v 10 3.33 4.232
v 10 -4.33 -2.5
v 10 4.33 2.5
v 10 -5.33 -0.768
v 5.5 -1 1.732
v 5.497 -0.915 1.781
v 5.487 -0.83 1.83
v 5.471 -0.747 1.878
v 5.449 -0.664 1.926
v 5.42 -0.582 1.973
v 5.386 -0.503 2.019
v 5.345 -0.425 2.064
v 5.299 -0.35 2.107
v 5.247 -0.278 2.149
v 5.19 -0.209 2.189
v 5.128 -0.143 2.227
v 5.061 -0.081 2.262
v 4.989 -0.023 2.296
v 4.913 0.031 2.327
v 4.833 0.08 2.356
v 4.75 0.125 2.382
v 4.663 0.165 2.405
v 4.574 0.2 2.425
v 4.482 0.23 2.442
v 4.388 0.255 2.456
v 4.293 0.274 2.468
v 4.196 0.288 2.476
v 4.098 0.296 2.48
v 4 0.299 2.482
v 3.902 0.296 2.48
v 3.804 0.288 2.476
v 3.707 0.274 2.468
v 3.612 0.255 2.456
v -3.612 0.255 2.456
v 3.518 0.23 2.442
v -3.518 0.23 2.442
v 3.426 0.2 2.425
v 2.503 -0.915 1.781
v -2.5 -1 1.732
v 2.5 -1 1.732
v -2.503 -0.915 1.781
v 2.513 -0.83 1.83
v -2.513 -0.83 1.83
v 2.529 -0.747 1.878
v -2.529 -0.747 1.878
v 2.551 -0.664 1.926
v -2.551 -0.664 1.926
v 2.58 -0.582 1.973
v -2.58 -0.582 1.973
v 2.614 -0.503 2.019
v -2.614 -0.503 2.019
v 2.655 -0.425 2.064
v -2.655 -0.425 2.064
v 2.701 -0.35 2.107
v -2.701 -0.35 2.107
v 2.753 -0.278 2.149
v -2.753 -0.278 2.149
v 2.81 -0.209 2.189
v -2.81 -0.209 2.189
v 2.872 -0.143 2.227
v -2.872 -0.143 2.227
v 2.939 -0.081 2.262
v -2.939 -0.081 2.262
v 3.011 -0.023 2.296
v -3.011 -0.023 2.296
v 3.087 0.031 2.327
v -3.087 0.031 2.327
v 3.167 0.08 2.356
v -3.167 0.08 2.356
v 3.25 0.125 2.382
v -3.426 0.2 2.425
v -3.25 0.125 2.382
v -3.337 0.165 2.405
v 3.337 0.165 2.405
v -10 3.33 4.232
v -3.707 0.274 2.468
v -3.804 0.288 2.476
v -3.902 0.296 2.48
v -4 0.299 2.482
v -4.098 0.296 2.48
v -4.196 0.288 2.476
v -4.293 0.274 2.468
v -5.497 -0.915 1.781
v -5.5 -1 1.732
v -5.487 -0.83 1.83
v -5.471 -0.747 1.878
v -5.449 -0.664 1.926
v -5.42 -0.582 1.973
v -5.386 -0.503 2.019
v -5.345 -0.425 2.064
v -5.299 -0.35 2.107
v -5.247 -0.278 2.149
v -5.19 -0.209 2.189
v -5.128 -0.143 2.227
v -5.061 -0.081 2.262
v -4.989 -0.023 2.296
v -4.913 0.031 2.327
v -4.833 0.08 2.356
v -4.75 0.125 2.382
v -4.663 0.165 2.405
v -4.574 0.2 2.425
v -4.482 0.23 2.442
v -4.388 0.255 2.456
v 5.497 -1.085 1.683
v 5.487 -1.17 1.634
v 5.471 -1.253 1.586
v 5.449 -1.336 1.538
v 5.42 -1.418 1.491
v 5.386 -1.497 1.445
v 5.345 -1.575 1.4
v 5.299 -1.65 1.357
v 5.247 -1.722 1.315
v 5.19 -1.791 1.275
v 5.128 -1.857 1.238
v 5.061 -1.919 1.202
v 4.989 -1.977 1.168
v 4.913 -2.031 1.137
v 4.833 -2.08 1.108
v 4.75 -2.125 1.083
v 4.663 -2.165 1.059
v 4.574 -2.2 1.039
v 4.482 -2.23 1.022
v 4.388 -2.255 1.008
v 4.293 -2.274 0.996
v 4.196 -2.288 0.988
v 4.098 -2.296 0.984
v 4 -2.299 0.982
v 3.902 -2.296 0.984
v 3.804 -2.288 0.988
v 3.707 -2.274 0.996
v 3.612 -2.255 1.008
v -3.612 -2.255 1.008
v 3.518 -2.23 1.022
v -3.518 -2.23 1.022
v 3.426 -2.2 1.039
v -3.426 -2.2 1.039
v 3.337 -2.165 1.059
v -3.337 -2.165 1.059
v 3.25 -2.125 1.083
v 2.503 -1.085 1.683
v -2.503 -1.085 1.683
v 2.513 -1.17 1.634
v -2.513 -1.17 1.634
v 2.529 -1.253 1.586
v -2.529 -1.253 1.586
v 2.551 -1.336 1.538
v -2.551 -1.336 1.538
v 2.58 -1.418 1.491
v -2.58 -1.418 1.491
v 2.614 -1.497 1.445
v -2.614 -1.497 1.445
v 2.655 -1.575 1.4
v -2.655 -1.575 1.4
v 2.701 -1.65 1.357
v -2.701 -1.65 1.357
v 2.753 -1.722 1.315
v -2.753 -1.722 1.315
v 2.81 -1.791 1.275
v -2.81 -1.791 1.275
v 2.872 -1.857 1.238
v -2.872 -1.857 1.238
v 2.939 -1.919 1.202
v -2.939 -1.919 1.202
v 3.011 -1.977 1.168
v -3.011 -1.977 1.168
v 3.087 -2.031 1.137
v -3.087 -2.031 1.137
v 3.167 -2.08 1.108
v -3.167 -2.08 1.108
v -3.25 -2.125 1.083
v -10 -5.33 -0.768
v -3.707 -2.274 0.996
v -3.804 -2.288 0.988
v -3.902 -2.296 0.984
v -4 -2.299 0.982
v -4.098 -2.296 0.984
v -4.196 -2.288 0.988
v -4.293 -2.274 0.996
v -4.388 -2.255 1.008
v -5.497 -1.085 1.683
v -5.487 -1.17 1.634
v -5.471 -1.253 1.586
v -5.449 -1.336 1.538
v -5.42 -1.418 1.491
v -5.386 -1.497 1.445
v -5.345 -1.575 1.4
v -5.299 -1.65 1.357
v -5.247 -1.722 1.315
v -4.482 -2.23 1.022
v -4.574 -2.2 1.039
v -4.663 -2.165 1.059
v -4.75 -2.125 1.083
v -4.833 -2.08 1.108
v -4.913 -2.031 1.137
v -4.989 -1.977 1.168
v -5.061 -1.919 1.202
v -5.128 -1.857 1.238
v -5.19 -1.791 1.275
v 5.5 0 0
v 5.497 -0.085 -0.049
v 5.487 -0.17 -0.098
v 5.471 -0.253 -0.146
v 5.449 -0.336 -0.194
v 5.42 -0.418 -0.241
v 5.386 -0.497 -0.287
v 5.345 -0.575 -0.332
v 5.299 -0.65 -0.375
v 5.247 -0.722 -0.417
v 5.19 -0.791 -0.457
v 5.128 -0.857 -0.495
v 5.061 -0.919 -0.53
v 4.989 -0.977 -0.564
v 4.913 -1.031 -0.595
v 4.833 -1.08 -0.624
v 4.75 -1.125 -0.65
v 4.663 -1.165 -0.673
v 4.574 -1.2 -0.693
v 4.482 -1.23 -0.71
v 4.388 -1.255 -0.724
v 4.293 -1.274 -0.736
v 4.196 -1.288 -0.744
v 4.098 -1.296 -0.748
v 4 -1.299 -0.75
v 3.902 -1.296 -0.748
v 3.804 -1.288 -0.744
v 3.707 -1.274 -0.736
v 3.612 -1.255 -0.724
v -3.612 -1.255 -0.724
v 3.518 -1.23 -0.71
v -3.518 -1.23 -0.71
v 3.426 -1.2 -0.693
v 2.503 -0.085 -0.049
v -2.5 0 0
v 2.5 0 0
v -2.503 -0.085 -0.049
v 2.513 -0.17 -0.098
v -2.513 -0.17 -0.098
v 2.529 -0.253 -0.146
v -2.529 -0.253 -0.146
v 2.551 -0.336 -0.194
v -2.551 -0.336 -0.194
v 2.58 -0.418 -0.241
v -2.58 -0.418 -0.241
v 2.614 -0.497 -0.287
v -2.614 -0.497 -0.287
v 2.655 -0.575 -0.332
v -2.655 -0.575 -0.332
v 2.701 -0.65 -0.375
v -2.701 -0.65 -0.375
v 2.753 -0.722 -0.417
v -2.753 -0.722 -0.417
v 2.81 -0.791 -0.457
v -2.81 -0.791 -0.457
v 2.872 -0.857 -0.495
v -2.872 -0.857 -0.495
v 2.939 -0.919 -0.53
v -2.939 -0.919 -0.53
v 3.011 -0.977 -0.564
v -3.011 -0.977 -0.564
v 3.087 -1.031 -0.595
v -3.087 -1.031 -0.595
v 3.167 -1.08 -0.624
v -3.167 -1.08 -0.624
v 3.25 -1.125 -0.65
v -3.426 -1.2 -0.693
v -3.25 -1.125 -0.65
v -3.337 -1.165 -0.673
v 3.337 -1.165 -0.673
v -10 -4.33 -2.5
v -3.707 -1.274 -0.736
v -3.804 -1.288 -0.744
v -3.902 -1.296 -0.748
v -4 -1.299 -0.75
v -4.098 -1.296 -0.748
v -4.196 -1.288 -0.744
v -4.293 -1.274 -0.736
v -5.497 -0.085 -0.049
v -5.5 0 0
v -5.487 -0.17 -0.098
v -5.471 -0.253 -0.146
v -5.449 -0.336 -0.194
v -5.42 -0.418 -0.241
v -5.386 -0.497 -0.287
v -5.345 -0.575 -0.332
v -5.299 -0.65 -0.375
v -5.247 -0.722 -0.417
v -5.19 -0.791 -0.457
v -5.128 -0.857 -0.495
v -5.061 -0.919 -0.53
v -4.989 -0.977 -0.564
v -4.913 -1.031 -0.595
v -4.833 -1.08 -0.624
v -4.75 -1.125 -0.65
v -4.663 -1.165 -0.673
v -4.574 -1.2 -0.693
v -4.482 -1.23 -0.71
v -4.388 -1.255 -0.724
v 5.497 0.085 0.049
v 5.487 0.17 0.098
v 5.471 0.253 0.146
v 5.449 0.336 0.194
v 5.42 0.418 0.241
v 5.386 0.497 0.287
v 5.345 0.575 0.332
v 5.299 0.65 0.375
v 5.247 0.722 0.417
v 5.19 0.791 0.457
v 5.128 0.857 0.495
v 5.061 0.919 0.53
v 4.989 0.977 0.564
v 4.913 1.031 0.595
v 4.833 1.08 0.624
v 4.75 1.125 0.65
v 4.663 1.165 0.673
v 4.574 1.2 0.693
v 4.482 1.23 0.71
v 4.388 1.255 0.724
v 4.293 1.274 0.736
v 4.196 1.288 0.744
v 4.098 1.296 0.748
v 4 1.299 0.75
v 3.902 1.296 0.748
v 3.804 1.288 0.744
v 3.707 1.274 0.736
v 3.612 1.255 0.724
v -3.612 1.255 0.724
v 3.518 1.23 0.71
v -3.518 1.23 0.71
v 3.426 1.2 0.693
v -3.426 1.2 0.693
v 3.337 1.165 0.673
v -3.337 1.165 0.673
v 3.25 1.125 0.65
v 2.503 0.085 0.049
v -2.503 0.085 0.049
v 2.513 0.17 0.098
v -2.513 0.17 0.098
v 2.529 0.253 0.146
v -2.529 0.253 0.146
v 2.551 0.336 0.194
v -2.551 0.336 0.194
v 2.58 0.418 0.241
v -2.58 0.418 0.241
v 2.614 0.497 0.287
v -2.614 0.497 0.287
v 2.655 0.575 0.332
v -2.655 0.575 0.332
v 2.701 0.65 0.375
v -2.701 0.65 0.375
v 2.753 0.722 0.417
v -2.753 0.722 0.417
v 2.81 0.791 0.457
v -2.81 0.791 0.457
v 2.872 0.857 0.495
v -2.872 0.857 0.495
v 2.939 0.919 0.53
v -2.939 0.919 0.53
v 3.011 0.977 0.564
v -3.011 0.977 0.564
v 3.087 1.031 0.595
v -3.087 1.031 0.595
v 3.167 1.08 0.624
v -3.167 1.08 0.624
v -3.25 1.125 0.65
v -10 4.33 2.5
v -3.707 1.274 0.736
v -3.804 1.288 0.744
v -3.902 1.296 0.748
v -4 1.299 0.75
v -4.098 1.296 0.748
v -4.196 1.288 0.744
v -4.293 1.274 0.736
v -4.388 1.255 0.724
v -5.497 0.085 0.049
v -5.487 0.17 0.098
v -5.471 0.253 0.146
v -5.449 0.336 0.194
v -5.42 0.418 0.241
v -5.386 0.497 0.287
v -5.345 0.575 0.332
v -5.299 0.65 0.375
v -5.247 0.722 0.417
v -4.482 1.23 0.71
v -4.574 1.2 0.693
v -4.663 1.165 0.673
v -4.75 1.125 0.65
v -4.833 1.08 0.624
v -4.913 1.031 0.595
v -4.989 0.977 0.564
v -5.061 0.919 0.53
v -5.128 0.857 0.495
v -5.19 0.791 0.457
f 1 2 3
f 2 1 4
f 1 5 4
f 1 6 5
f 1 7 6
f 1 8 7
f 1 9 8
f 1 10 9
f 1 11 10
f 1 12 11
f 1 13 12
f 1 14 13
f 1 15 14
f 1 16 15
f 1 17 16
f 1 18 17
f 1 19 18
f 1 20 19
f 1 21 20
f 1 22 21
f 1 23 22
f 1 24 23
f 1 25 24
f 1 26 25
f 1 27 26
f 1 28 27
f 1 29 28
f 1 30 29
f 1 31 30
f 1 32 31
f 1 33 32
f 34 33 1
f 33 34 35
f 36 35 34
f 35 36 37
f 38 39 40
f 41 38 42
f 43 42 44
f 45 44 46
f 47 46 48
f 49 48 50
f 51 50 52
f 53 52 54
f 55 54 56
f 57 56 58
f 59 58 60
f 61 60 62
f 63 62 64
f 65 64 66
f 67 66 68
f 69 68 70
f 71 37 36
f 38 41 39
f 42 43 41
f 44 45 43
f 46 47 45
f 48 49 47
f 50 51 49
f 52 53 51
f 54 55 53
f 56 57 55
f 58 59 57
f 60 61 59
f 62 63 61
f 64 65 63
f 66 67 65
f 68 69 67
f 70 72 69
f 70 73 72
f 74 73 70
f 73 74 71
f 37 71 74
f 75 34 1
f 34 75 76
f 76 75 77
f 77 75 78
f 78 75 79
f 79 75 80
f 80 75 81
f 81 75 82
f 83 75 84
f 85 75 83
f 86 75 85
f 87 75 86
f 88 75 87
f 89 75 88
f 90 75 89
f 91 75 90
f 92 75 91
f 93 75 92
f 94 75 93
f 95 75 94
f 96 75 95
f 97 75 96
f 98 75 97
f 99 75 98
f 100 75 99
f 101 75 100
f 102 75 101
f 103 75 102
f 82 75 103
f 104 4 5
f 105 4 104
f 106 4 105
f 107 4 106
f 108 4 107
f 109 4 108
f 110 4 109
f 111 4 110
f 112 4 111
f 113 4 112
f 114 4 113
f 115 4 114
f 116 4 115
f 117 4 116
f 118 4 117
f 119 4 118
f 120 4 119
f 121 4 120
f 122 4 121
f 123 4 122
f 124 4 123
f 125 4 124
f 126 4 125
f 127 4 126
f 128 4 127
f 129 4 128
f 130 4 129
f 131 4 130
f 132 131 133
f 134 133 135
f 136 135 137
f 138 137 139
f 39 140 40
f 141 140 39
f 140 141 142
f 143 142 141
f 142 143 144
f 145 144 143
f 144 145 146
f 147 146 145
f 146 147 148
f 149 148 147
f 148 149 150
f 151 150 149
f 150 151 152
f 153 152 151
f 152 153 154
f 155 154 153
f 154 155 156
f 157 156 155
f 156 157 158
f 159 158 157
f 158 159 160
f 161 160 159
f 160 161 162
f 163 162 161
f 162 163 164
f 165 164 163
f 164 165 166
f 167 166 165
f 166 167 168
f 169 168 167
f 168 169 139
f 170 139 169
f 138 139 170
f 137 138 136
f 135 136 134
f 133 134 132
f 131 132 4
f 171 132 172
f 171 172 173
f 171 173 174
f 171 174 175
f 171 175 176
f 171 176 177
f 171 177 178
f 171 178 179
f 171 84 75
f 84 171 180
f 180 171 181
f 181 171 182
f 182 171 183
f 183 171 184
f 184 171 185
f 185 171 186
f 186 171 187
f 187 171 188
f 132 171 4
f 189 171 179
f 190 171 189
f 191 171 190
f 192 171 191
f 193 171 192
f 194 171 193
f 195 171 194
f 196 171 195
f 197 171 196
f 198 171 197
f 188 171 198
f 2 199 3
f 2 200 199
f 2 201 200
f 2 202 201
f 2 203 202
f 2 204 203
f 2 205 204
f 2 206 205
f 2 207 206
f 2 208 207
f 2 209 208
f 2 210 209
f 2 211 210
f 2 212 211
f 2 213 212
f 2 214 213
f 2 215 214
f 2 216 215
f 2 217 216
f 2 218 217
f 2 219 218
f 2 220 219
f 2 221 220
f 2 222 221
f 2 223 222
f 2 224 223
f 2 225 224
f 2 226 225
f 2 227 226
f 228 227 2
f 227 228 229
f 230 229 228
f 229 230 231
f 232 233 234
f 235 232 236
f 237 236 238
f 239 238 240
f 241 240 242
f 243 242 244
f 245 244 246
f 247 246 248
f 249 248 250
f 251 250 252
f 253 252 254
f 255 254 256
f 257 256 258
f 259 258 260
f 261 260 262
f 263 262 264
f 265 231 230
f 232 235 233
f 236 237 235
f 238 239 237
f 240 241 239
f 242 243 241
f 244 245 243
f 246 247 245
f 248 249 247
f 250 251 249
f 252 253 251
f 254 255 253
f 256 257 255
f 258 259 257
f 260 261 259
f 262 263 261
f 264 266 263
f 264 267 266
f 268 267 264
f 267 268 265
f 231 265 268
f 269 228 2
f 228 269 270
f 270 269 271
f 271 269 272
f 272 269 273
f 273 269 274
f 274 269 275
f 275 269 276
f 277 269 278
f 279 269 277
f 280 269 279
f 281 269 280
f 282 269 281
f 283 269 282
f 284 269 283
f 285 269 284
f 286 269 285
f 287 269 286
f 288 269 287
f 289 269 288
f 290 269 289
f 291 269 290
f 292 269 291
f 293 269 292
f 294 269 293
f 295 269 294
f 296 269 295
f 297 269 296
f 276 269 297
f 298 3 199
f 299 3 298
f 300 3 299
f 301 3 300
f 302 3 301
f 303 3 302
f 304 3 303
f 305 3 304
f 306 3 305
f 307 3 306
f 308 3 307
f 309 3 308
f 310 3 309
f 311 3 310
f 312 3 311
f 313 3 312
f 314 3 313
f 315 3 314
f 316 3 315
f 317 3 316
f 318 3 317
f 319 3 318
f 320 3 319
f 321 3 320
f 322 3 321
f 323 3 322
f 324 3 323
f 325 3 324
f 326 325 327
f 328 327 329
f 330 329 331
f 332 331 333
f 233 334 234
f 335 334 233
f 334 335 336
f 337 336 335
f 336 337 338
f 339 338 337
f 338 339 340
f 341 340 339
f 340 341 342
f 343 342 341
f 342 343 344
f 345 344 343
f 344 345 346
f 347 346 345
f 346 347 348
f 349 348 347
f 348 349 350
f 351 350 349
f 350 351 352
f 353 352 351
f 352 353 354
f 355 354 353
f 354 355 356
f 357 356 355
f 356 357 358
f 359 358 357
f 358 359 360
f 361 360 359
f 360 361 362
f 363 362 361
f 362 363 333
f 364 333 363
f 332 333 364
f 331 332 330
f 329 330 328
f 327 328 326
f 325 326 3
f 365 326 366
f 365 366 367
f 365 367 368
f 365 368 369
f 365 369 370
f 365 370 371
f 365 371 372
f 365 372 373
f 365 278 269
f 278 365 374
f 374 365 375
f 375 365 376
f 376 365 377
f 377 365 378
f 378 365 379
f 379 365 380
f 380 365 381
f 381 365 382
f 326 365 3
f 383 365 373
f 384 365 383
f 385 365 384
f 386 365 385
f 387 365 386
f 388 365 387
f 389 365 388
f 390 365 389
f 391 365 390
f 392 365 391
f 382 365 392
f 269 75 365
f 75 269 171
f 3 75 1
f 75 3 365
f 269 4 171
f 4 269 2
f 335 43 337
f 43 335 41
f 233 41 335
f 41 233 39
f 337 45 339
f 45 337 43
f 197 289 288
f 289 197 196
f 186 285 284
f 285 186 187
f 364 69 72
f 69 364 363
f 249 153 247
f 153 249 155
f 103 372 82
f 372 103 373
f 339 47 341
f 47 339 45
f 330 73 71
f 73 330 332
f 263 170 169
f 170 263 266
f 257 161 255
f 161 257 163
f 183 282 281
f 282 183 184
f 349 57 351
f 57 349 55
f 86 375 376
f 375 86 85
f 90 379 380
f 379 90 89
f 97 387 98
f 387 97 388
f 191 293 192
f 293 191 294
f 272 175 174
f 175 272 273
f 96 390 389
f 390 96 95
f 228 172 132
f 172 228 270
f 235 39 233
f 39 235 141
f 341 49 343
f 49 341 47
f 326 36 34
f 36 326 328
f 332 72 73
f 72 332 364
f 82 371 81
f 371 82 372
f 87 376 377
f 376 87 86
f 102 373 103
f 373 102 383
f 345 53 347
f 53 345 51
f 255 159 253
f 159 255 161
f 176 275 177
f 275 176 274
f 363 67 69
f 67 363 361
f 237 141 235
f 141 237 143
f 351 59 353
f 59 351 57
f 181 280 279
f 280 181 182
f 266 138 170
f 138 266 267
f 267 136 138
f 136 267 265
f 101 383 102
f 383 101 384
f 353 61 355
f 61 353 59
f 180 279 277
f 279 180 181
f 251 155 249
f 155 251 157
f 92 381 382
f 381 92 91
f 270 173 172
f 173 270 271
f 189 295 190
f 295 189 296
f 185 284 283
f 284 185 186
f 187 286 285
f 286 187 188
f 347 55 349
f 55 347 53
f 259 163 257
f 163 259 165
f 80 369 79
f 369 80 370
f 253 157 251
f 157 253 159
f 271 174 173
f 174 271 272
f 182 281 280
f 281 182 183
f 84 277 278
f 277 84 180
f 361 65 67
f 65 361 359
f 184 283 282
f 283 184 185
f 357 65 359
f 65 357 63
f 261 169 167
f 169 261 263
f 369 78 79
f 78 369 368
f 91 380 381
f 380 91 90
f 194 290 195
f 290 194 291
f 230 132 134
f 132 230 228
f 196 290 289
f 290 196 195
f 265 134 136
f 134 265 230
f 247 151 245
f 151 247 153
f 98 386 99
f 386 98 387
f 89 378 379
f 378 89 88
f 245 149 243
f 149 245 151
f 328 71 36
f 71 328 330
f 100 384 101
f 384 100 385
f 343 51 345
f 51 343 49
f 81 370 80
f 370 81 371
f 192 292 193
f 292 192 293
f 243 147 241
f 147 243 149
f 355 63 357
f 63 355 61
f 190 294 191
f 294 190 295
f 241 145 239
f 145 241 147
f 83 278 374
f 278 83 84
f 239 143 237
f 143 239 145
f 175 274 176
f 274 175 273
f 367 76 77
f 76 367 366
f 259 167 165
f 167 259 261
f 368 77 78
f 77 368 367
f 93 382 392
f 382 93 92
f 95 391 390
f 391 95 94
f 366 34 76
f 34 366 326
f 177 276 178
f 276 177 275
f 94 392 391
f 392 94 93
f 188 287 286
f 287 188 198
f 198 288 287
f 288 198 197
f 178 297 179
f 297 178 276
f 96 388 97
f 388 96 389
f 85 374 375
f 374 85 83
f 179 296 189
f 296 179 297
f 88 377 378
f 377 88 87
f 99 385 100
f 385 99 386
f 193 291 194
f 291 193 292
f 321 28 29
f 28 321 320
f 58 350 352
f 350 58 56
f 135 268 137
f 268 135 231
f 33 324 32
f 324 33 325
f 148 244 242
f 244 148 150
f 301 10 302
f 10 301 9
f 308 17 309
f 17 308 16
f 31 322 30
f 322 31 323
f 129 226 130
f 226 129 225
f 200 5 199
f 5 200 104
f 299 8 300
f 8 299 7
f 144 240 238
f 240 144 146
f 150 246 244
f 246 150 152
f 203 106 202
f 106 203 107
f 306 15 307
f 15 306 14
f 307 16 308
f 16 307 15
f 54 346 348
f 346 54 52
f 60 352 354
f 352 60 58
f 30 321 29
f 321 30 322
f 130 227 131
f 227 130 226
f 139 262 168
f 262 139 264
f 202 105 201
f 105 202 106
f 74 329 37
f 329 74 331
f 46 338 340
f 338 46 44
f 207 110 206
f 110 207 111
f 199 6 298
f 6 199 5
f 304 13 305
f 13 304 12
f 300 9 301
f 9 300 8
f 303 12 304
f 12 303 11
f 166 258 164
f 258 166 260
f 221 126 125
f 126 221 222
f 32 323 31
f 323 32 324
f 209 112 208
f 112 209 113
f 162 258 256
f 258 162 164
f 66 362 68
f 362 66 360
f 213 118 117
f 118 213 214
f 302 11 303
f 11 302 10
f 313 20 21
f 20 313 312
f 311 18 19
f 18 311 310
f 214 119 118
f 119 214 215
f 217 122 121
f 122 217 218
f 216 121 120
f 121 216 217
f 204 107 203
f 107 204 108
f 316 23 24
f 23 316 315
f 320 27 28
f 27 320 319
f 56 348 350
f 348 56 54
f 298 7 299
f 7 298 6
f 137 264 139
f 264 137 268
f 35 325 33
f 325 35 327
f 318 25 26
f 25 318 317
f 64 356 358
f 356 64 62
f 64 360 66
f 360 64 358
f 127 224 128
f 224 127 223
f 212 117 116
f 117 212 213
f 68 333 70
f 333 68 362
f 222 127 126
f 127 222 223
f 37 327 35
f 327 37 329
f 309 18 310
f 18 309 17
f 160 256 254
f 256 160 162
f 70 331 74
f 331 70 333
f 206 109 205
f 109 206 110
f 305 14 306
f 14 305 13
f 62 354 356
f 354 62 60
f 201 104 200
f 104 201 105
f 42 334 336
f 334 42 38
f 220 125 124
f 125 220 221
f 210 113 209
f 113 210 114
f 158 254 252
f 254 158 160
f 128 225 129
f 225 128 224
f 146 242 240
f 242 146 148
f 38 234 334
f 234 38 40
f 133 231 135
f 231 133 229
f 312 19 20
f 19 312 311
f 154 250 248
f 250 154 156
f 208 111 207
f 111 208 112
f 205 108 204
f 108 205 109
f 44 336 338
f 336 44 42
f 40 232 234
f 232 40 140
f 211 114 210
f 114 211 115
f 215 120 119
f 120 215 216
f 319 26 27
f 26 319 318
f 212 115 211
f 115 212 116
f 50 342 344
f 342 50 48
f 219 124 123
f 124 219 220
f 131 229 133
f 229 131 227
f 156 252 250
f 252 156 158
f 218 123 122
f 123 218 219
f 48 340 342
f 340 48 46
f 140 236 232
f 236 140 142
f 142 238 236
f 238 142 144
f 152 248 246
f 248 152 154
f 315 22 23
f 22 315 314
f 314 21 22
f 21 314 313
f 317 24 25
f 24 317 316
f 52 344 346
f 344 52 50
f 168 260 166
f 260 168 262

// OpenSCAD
// Auto-generated from tests/data/feature_fixtures_manifest.json
// fixture: plate_rotated_x30_with_two_holes
// fixture_type: plate
// description: Plate rotated 30° around X with two through-holes in a linear pattern. Validates rotated-plate local-frame cutout detection for non-Z-axis rotation.
// transform: rotate=[30.000000, 0.000000, 0.000000], translate=[0.000000, 0.000000, 0.000000]
$fn = 96;

plate_size = [20.000000, 10.000000, 2.000000];
plate_origin = [-10.000000, -5.000000, 0.000000];

module through_hole(center, diameter, height) {
  translate(center) cylinder(d=diameter, h=height, center=false);
}

module through_slot(start, end, width, height) {
  hull() {
    through_hole(start, width, height);
    through_hole(end, width, height);
  }
}

module counterbore_hole(center, through_d, bore_d, bore_depth, plate_thickness) {
  translate([center[0], center[1], -0.1])
    cylinder(d=through_d, h=plate_thickness + 0.2, center=false);
  translate([center[0], center[1], plate_thickness - bore_depth])
    cylinder(d=bore_d, h=bore_depth + 0.1, center=false);
}

translate([0.000000, 0.000000, 0.000000])
rotate([30.000000, 0.000000, 0.000000]) {
difference() {
  translate(plate_origin) cube(plate_size);
  through_hole([-4.000000, 0.000000, -0.100000], 3.000000, 2.200000);  // hole_0
  through_hole([4.000000, 0.000000, -0.100000], 3.000000, 2.200000);  // hole_1
}
}
